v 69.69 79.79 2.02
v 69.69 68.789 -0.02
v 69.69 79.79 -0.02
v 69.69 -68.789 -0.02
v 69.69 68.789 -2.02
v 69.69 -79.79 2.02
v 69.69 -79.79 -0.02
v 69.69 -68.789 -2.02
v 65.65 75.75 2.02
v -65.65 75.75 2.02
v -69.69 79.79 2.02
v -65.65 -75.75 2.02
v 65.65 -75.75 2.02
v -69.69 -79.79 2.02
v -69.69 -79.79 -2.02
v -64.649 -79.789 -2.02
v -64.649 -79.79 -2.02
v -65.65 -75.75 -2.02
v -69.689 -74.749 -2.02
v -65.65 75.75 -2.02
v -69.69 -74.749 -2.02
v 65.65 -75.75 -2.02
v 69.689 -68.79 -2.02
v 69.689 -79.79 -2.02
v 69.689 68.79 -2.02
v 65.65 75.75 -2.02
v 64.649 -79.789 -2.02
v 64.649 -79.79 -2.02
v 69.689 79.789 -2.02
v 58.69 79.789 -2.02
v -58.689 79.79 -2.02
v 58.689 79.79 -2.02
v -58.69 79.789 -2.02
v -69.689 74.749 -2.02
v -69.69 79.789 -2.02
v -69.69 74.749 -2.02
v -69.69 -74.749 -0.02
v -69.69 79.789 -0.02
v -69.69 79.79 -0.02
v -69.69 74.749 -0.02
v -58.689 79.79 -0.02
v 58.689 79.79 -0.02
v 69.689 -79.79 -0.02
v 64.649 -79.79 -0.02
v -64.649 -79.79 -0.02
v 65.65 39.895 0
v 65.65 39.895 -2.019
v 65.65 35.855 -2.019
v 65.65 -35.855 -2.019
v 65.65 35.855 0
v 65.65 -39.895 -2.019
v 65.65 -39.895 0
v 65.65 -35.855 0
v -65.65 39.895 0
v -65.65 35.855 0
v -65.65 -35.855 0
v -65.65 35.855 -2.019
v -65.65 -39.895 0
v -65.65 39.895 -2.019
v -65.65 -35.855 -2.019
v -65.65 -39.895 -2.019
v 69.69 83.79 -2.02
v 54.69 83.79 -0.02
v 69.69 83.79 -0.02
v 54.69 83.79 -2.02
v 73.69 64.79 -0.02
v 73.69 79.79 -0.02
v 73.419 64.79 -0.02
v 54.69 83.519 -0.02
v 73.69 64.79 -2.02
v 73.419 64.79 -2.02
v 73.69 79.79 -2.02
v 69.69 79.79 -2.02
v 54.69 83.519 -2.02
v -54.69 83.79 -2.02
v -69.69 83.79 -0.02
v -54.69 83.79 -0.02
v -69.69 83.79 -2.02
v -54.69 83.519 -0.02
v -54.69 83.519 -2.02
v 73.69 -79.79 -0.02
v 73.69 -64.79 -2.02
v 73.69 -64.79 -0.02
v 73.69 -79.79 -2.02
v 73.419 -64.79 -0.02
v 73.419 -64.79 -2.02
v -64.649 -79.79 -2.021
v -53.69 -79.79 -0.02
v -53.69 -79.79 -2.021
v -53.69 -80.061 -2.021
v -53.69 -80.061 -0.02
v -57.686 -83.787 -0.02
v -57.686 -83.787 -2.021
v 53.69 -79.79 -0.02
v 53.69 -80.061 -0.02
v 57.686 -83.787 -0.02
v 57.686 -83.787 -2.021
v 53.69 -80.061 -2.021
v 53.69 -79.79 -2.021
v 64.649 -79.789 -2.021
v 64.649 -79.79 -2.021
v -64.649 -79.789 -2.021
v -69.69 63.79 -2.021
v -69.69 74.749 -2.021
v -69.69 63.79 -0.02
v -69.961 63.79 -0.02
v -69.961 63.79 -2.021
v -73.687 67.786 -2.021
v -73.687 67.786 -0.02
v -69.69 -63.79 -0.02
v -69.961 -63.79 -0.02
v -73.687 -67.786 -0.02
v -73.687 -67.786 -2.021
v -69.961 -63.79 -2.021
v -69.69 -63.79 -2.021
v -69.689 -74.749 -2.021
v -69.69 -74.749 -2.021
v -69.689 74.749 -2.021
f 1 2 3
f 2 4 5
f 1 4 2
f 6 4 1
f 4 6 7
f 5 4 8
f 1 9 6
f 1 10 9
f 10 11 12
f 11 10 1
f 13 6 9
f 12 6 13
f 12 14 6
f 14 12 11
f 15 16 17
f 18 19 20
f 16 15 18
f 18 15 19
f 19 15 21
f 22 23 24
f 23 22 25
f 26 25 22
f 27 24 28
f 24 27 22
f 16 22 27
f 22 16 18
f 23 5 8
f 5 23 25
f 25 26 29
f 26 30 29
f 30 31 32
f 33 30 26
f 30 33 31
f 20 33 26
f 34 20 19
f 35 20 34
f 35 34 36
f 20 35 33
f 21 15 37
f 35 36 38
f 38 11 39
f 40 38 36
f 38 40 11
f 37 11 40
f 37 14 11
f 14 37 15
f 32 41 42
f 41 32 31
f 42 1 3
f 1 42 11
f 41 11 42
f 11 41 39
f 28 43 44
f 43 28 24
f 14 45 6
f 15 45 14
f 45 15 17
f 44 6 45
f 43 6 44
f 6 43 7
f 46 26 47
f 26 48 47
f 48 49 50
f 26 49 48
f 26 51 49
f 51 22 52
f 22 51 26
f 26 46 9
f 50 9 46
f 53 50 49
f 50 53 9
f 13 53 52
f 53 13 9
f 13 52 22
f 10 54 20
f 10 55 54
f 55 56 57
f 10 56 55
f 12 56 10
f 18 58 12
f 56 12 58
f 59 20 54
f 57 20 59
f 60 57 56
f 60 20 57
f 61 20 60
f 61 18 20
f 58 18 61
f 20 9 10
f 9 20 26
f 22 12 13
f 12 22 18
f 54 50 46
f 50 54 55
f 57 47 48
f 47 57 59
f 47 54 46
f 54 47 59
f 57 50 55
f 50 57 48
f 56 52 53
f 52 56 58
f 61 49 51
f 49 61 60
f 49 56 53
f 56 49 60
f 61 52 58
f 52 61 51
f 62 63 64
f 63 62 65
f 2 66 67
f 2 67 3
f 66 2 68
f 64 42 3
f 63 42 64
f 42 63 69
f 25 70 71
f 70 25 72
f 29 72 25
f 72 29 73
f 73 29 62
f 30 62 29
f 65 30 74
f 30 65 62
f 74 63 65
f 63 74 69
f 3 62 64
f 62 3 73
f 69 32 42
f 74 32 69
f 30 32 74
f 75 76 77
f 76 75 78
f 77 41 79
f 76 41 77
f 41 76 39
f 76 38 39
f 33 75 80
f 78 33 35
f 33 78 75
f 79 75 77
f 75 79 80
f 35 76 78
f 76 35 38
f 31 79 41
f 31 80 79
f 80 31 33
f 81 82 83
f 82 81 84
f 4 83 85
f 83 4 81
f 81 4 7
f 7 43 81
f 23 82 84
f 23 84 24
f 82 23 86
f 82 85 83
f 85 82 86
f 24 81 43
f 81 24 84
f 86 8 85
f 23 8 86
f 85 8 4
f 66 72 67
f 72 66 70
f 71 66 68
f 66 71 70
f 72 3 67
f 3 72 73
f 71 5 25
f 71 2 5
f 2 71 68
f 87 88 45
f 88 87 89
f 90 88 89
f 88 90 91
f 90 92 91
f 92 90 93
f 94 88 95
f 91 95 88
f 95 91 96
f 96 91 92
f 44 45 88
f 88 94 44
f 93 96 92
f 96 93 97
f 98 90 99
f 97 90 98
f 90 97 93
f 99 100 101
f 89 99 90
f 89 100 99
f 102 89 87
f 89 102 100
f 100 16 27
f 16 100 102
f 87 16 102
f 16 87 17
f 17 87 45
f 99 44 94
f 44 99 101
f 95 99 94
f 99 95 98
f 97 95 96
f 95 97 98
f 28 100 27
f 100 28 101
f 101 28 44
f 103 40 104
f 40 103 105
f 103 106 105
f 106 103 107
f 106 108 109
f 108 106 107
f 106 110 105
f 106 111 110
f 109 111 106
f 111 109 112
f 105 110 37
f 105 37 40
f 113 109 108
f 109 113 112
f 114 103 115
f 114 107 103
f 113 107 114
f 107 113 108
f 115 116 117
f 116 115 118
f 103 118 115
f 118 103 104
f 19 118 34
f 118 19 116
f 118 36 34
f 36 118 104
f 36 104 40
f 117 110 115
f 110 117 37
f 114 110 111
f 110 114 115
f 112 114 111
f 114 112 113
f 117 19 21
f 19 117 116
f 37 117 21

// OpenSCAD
// Interlocking tile holder

// Bar type
crossbars = false;

// The size of the tile
t_width = 150;
t_length = 130;
t_height = 2;

// The size of the connectors
connect_width = 15;
connect_height = 2;
connect_length = 4;
connect_angle = 47;

// The fit factor
tile_fit = 1.01;

// The size of the tile
tile_width = t_width * tile_fit;
tile_length = t_length * tile_fit;
tile_height = t_height * tile_fit;

holder_height = tile_height * 2;
holder_thickness = holder_height;

bar_height = holder_thickness / 2;
bar_width = holder_thickness;

// Overlap factor
diff_factor = .001;

// Always have the longest/shortest edge in the same direction
if(tile_width < tile_length) {
    holder(tile_width, tile_length);
} else {
    holder(tile_length, tile_width);
}

// Create the holder
module holder(tw, tl) {
    union() {
        //Base plate
        difference() {
            cube(
                [
                    tw + 2 * holder_thickness,
                    tl + 2 * holder_thickness,
                    holder_height
                ],
                center = true);

            cube(
                [
                    tw,
                    tl,
                    holder_height + diff_factor
                ],
                center = true);
        }
        // Bars
        bar_pos = tl / 4;
   
        if(crossbars) {
            crossbar( bar_pos, tw, tl);
        } else {
            bar(bar_pos, tw, tl);
            bar(-bar_pos, tw, tl);
        }

        // Connectors
        female_horizontal(tw, tl, 0, 0, 0);
        female_vertical(tw, tl, 0, 0, 0);
        
        male_horizontal(tw, tl);
        male_vertical(tw, tl);
    }
};


module male_vertical(tw, tl)
{
    rotate([0, 0, -90])
        male_horizontal(tl, tw);
}

module male_horizontal(tw, tl)
{
    translate([1, 0, 0])
    {
        difference() {
            edge(tw, tl);
            connector(tw, tl);
        }
    }
    
    translate([-1, 0, 0]) {
        mirror([1, 0, 0]) {
            difference() {
                edge(tw, tl);
                connector(tw, tl);
            }
        }
    }
}

module connector(tw, tl)
{
    translate(
        [
            0,
            -tl - 2 * holder_thickness - connect_length,
            -diff_factor
        ])
    {
        female_horizontal(tw, tl, 0, 0, 2);
    }
}

module edge(tw, tl) {
    translate(
        [
            0,
            -tl / 2 - holder_thickness + diff_factor,
            -holder_thickness / 2 - diff_factor
        ])
    {
        rotate(180) {
            cube(
                [
                    tw / 2 - diff_factor,
                    connect_length - 2 * diff_factor,
                    connect_height + diff_factor
                ]);
        }
    }
}


module female_horizontal(tw, tl, extra_width, extra_length, extra_height)
{   
    rotate([0, 0, 90])
        vertical_corner(tl, tw, extra_width, extra_length, extra_height);

    mirror([1, 0, 0])
        rotate([0, 0, 90])
            vertical_corner(tl, tw, extra_width, extra_length, extra_height);
}

module female_vertical(tw, tl, extra_width, extra_length, extra_height)
{   
    vertical_corner(tw, tl, extra_width, extra_length, extra_height);

    mirror([0, 1, 0])
        vertical_corner(tw, tl, extra_width, extra_length, extra_height);
}

module vertical_corner(tw, tl, extra_width, extra_length, extra_height)
{
    angle_sides = connect_width + connect_length + extra_width + extra_length;

    translate(
        [
            tw / 2 + holder_thickness - diff_factor,
            -tl / 2 - holder_thickness,
            -holder_thickness / 2 - extra_height
        ])
    {
        difference() {
            cube(
                [
                    connect_length + extra_length + diff_factor,
                    connect_width - extra_width,
                    connect_height + 2 * extra_height
                ]); 

            translate(
                [
                    0,
                    connect_width - connect_length + extra_width,
                    -2 * connect_height
                ])
            {
                rotate(connect_angle)
                {
                    cube(
                        [
                            angle_sides + diff_factor,
                            angle_sides + diff_factor,
                            4 * (connect_height + extra_height)
                        ]);
                }
            }
        }
    }
}

module bar(pos, tw, tl)
{
    translate( [
        0,
        pos,
        -bar_height / 2
    ])
    {
        cube(
            [
                tw + 2 * (holder_thickness - diff_factor),
                bar_width,
                bar_height - diff_factor
            ],
            center = true);
    }
}

module crossbar(pos, tw, tl)
{
    w = tw - tw / 4 + bar_width * 2;
    l = tl - tl / 2 + bar_width * 2;

    h = sqrt(w * w + l * l);

    translate(
        [
            -tw / 4 - bar_width,
            -tl / 2 - bar_width,
            -bar_height
        ])
        rotate(atan2(l, w))
        {
            cube(
                [
                    h,
                    bar_width,
                    bar_height
                ]);
        }

    mirror([1,0,0])
        mirror([0,1,0])
            translate(
                [
                    -tw / 4 - bar_width,
                    -tl / 2 - bar_width,
                    -bar_height
                ])
                rotate(atan2(l, w))
                {
                    cube(
                        [
                            h,
                            bar_width,
                            bar_height
                        ]);
                }
}
